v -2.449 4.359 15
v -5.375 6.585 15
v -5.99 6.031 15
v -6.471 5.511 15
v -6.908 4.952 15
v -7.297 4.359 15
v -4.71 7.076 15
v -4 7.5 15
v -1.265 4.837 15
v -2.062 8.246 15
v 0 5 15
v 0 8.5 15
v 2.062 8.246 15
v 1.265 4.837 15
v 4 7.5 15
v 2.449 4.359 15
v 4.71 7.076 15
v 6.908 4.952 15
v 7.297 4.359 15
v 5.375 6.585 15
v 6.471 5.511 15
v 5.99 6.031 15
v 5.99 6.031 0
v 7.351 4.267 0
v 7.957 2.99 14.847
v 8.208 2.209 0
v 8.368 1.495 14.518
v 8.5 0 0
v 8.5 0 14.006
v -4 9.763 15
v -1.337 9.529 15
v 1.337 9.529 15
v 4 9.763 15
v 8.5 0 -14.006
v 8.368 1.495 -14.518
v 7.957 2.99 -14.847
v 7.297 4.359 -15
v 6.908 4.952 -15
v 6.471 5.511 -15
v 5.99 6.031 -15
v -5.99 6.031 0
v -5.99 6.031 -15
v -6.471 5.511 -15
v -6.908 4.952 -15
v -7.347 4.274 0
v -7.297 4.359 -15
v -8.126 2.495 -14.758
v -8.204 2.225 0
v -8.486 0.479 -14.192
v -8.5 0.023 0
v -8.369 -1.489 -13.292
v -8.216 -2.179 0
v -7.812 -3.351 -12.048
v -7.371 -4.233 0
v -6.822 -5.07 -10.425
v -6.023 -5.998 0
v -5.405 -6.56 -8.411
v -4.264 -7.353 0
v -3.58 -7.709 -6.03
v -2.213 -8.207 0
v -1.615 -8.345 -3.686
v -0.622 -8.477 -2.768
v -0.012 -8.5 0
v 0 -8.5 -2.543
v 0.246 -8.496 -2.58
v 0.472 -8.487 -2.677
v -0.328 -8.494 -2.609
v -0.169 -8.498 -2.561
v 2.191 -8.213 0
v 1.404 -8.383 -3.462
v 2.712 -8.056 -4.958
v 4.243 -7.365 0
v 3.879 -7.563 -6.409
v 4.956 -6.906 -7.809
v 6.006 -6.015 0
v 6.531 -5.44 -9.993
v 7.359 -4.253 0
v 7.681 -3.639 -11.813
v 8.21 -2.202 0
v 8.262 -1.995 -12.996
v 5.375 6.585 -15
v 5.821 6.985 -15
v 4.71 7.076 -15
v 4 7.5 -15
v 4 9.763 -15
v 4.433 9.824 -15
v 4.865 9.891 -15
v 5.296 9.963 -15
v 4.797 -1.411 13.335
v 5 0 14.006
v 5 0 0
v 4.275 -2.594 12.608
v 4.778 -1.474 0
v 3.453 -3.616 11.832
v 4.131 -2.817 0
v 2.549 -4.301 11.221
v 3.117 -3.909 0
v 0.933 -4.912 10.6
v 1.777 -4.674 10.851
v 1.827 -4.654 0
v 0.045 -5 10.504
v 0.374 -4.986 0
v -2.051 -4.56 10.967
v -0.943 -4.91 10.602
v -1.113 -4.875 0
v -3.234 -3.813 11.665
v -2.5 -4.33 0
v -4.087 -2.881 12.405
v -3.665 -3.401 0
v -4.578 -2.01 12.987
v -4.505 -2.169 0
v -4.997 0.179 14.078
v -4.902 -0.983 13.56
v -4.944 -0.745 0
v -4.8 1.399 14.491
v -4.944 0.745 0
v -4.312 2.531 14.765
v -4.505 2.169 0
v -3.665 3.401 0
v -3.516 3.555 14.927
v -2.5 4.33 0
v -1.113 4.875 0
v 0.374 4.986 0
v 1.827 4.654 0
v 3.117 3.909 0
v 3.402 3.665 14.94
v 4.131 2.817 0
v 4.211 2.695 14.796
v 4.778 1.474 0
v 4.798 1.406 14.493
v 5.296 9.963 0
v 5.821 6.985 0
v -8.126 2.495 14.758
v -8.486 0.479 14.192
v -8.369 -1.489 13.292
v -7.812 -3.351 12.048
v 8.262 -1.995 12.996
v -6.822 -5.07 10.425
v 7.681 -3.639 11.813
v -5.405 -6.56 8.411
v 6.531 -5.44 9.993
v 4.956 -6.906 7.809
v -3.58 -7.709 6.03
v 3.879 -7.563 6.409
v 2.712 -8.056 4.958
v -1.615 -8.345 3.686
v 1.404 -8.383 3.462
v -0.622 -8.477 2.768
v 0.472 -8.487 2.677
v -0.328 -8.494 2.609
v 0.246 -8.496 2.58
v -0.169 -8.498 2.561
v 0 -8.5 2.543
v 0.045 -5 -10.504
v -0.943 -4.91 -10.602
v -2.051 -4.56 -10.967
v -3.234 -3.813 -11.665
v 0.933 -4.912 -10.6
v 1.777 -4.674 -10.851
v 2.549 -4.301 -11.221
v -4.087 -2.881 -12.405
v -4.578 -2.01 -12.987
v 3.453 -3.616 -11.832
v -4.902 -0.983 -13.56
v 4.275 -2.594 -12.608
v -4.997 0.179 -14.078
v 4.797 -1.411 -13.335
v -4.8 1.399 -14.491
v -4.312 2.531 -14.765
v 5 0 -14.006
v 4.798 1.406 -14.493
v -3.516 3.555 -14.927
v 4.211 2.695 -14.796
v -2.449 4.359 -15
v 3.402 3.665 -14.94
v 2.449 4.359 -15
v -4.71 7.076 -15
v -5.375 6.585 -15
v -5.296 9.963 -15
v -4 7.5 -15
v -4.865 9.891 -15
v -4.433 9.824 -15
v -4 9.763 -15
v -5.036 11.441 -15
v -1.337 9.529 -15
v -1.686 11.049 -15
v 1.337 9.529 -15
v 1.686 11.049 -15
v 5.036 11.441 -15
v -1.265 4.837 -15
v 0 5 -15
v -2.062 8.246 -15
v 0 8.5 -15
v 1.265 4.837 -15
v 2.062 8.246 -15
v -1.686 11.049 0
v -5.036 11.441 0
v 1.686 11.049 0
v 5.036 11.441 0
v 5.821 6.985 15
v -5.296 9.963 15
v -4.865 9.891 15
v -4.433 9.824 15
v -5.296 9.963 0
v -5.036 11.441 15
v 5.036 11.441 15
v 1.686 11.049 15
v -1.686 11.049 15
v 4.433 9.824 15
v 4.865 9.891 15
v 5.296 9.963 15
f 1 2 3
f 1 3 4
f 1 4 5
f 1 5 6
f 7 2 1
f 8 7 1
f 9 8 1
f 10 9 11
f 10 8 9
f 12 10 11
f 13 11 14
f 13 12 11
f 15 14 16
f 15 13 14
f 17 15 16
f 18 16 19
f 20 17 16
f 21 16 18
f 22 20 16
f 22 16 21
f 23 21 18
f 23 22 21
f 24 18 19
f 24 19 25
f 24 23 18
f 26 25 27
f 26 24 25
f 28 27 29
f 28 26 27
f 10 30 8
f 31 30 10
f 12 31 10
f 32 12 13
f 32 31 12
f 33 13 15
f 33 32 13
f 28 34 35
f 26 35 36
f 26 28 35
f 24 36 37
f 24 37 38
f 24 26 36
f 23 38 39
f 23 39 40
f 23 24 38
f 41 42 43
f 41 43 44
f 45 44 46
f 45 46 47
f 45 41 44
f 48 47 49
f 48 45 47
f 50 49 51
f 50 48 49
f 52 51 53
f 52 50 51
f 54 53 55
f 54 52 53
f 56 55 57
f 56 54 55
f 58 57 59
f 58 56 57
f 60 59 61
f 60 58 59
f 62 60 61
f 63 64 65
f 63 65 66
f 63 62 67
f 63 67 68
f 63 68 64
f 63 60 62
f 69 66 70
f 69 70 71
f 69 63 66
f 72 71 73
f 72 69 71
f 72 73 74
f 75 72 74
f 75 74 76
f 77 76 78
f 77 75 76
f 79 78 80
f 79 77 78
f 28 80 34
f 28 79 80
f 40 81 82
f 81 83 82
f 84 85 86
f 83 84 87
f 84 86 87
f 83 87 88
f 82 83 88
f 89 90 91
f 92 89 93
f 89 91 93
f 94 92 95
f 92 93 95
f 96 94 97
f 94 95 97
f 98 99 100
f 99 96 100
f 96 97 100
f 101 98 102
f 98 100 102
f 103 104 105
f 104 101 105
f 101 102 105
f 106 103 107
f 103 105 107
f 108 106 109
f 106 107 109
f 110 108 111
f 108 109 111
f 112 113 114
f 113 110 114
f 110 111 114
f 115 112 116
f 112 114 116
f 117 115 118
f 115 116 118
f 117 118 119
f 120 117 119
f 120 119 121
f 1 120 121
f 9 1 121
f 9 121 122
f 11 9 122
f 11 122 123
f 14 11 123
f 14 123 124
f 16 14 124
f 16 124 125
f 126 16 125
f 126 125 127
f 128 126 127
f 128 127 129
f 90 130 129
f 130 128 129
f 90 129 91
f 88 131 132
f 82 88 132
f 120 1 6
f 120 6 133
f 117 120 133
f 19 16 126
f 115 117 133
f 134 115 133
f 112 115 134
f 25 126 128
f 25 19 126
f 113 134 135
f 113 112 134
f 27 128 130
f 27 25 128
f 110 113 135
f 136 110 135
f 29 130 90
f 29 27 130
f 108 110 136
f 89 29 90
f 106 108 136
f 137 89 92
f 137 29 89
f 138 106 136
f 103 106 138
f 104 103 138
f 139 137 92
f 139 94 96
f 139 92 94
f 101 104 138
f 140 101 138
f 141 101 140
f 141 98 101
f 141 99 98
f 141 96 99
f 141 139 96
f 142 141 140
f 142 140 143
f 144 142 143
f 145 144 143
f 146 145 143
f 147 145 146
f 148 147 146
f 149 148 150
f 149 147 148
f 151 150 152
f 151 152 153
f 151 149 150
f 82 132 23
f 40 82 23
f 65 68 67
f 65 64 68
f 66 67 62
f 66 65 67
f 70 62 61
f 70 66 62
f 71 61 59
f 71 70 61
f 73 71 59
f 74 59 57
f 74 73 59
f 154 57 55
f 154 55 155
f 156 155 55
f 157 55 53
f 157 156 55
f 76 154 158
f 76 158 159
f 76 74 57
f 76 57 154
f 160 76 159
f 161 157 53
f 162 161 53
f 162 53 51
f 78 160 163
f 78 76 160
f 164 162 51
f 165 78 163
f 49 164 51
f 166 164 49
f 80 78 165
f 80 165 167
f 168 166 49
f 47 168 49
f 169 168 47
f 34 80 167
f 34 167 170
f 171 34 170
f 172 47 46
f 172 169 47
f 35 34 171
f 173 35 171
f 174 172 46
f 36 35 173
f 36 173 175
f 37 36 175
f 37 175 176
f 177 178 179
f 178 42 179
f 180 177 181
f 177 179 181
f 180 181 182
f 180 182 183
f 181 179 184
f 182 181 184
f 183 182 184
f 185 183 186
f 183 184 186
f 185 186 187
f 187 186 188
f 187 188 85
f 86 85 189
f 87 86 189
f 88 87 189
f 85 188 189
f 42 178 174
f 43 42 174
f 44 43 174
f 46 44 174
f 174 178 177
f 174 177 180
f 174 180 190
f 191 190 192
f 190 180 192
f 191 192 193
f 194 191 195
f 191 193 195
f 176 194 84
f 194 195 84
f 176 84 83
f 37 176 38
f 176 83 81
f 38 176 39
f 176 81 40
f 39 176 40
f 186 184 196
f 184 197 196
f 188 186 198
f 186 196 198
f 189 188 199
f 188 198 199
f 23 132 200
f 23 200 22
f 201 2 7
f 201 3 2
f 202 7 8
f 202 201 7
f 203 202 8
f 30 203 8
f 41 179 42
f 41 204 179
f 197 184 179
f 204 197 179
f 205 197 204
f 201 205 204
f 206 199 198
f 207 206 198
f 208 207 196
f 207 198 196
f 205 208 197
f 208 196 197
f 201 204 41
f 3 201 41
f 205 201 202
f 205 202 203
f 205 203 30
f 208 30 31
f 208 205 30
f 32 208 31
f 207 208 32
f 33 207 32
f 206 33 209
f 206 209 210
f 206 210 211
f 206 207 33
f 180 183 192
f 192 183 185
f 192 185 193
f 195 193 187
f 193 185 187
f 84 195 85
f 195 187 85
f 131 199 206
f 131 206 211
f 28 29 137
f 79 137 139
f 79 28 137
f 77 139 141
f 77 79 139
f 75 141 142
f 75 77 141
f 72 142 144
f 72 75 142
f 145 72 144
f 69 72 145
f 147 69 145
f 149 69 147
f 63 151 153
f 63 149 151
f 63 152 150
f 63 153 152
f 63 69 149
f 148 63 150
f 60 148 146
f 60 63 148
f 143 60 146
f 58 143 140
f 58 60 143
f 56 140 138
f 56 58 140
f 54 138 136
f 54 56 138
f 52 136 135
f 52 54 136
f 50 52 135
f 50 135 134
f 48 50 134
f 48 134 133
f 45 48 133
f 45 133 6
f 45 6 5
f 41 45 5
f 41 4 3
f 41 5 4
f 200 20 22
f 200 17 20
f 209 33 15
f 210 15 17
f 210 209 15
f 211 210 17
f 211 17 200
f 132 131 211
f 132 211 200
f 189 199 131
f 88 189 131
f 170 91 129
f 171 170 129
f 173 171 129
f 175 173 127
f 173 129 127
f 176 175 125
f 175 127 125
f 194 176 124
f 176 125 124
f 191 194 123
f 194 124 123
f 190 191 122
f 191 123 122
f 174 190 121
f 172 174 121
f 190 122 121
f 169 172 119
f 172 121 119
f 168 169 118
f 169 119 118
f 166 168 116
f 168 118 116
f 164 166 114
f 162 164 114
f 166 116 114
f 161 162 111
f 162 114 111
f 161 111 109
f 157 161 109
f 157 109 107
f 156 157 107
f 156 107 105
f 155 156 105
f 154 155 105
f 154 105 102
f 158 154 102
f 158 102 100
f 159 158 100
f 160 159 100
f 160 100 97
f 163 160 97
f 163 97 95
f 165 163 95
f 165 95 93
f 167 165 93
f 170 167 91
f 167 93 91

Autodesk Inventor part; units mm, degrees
ref_plane "YZ Plane" through (0, 0, 0) normal (1, 0, 0) x (0, 1, 0)
ref_plane "XZ Plane" through (0, 0, 0) normal (0, 1, 0) x (-1, 0, 0)
ref_plane "XY Plane" through (0, 0, 0) normal (0, 0, 1) x (1, 0, 0)
sketch "Skizze1" plane through (0, 0, 0) normal (0, 0, 1) x (1, 0, 0)
  circle A0 centre (0, 0) radius 5
  circle A1 centre (0, 0) radius 8.5
  dimension "d0" = 10
  dimension "d1" = 17
extrude "Extrusion1" add sketch "Skizze1" along normal mid plane 30
sketch "Skizze2" plane through (0, 0, 0) normal (0, 0, 1) x (1, 0, 0)
  line L0 (0, 40.0774) -> (0, -42.4456) construction
  line L1 (-37.8898, 0) -> (75.0495, 0) construction
  circle A0 centre (0, 40) radius 30.5 construction
  circle A1 centre (0, 40) radius 30.5
  circle A2 centre (0, 0) radius 8.5 projected
  line L2 (-4, 7.5) -> (-4, 9.7634)
  line L3 (4, 7.5) -> (4, 9.7634)
  circle A3 centre (0, 0) radius 8.5
  circle A4 centre (0, 40) radius 29
  line L4 (0, 40) -> (5.9896, 6.0311)
  line L5 (5.8214, 6.9852) -> (0, 40)
  line L6 (0, 40) -> (-5.9896, 6.0311)
  point P0 (-5.0358, 11.4406)
  point P1 (-5.9896, 6.0311)
  point P2 (5.9896, 6.0311)
  point P3 (5.0358, 11.4406)
  dimension "d4" = 61
  dimension "d5" = 40
  dimension "d6" = 8
  dimension "d7" = 1.5
  dimension "d8" = 10
  dimension "d9" = 10
extrude "Extrusion2" add sketch "Skizze2" along normal mid plane 30 contours A1 L6 A4 L4 | L2 A2 L6 A1 | A1 L3 A2 L2 | A1 L4 A2 L3 picked at (3.574, 10.751)
sketch "Skizze3" plane through (0, 0, 0) normal (1, 0, 0) x (0, 1, 0)
  line L0 (-8.5, -15) -> (-8.5, 15) projected
  line L1 (-8.5, -15) -> (6.0311, -15) projected
  arc A0 (-8.5, 0) -> (6.0311, -15) centre (5.1952, -1.2713) ccw
  line L2 (6.0311, -15) -> (-8.5, -15)
  line L3 (-8.5, -15) -> (-8.5, 0)
  point P0 (0, 0)
  point P1 (4.3593, -15)
  point P2 (-8.5, -2.5427)
extrude "Extrusion3" cut sketch "Skizze3" against normal mid plane 30 contours L0 A0 L1
mirror "Spiegeln1" about plane through (0, 0, 0) normal (0, 0, 1) of "Extrusion3"
properties part number "duct_round"
